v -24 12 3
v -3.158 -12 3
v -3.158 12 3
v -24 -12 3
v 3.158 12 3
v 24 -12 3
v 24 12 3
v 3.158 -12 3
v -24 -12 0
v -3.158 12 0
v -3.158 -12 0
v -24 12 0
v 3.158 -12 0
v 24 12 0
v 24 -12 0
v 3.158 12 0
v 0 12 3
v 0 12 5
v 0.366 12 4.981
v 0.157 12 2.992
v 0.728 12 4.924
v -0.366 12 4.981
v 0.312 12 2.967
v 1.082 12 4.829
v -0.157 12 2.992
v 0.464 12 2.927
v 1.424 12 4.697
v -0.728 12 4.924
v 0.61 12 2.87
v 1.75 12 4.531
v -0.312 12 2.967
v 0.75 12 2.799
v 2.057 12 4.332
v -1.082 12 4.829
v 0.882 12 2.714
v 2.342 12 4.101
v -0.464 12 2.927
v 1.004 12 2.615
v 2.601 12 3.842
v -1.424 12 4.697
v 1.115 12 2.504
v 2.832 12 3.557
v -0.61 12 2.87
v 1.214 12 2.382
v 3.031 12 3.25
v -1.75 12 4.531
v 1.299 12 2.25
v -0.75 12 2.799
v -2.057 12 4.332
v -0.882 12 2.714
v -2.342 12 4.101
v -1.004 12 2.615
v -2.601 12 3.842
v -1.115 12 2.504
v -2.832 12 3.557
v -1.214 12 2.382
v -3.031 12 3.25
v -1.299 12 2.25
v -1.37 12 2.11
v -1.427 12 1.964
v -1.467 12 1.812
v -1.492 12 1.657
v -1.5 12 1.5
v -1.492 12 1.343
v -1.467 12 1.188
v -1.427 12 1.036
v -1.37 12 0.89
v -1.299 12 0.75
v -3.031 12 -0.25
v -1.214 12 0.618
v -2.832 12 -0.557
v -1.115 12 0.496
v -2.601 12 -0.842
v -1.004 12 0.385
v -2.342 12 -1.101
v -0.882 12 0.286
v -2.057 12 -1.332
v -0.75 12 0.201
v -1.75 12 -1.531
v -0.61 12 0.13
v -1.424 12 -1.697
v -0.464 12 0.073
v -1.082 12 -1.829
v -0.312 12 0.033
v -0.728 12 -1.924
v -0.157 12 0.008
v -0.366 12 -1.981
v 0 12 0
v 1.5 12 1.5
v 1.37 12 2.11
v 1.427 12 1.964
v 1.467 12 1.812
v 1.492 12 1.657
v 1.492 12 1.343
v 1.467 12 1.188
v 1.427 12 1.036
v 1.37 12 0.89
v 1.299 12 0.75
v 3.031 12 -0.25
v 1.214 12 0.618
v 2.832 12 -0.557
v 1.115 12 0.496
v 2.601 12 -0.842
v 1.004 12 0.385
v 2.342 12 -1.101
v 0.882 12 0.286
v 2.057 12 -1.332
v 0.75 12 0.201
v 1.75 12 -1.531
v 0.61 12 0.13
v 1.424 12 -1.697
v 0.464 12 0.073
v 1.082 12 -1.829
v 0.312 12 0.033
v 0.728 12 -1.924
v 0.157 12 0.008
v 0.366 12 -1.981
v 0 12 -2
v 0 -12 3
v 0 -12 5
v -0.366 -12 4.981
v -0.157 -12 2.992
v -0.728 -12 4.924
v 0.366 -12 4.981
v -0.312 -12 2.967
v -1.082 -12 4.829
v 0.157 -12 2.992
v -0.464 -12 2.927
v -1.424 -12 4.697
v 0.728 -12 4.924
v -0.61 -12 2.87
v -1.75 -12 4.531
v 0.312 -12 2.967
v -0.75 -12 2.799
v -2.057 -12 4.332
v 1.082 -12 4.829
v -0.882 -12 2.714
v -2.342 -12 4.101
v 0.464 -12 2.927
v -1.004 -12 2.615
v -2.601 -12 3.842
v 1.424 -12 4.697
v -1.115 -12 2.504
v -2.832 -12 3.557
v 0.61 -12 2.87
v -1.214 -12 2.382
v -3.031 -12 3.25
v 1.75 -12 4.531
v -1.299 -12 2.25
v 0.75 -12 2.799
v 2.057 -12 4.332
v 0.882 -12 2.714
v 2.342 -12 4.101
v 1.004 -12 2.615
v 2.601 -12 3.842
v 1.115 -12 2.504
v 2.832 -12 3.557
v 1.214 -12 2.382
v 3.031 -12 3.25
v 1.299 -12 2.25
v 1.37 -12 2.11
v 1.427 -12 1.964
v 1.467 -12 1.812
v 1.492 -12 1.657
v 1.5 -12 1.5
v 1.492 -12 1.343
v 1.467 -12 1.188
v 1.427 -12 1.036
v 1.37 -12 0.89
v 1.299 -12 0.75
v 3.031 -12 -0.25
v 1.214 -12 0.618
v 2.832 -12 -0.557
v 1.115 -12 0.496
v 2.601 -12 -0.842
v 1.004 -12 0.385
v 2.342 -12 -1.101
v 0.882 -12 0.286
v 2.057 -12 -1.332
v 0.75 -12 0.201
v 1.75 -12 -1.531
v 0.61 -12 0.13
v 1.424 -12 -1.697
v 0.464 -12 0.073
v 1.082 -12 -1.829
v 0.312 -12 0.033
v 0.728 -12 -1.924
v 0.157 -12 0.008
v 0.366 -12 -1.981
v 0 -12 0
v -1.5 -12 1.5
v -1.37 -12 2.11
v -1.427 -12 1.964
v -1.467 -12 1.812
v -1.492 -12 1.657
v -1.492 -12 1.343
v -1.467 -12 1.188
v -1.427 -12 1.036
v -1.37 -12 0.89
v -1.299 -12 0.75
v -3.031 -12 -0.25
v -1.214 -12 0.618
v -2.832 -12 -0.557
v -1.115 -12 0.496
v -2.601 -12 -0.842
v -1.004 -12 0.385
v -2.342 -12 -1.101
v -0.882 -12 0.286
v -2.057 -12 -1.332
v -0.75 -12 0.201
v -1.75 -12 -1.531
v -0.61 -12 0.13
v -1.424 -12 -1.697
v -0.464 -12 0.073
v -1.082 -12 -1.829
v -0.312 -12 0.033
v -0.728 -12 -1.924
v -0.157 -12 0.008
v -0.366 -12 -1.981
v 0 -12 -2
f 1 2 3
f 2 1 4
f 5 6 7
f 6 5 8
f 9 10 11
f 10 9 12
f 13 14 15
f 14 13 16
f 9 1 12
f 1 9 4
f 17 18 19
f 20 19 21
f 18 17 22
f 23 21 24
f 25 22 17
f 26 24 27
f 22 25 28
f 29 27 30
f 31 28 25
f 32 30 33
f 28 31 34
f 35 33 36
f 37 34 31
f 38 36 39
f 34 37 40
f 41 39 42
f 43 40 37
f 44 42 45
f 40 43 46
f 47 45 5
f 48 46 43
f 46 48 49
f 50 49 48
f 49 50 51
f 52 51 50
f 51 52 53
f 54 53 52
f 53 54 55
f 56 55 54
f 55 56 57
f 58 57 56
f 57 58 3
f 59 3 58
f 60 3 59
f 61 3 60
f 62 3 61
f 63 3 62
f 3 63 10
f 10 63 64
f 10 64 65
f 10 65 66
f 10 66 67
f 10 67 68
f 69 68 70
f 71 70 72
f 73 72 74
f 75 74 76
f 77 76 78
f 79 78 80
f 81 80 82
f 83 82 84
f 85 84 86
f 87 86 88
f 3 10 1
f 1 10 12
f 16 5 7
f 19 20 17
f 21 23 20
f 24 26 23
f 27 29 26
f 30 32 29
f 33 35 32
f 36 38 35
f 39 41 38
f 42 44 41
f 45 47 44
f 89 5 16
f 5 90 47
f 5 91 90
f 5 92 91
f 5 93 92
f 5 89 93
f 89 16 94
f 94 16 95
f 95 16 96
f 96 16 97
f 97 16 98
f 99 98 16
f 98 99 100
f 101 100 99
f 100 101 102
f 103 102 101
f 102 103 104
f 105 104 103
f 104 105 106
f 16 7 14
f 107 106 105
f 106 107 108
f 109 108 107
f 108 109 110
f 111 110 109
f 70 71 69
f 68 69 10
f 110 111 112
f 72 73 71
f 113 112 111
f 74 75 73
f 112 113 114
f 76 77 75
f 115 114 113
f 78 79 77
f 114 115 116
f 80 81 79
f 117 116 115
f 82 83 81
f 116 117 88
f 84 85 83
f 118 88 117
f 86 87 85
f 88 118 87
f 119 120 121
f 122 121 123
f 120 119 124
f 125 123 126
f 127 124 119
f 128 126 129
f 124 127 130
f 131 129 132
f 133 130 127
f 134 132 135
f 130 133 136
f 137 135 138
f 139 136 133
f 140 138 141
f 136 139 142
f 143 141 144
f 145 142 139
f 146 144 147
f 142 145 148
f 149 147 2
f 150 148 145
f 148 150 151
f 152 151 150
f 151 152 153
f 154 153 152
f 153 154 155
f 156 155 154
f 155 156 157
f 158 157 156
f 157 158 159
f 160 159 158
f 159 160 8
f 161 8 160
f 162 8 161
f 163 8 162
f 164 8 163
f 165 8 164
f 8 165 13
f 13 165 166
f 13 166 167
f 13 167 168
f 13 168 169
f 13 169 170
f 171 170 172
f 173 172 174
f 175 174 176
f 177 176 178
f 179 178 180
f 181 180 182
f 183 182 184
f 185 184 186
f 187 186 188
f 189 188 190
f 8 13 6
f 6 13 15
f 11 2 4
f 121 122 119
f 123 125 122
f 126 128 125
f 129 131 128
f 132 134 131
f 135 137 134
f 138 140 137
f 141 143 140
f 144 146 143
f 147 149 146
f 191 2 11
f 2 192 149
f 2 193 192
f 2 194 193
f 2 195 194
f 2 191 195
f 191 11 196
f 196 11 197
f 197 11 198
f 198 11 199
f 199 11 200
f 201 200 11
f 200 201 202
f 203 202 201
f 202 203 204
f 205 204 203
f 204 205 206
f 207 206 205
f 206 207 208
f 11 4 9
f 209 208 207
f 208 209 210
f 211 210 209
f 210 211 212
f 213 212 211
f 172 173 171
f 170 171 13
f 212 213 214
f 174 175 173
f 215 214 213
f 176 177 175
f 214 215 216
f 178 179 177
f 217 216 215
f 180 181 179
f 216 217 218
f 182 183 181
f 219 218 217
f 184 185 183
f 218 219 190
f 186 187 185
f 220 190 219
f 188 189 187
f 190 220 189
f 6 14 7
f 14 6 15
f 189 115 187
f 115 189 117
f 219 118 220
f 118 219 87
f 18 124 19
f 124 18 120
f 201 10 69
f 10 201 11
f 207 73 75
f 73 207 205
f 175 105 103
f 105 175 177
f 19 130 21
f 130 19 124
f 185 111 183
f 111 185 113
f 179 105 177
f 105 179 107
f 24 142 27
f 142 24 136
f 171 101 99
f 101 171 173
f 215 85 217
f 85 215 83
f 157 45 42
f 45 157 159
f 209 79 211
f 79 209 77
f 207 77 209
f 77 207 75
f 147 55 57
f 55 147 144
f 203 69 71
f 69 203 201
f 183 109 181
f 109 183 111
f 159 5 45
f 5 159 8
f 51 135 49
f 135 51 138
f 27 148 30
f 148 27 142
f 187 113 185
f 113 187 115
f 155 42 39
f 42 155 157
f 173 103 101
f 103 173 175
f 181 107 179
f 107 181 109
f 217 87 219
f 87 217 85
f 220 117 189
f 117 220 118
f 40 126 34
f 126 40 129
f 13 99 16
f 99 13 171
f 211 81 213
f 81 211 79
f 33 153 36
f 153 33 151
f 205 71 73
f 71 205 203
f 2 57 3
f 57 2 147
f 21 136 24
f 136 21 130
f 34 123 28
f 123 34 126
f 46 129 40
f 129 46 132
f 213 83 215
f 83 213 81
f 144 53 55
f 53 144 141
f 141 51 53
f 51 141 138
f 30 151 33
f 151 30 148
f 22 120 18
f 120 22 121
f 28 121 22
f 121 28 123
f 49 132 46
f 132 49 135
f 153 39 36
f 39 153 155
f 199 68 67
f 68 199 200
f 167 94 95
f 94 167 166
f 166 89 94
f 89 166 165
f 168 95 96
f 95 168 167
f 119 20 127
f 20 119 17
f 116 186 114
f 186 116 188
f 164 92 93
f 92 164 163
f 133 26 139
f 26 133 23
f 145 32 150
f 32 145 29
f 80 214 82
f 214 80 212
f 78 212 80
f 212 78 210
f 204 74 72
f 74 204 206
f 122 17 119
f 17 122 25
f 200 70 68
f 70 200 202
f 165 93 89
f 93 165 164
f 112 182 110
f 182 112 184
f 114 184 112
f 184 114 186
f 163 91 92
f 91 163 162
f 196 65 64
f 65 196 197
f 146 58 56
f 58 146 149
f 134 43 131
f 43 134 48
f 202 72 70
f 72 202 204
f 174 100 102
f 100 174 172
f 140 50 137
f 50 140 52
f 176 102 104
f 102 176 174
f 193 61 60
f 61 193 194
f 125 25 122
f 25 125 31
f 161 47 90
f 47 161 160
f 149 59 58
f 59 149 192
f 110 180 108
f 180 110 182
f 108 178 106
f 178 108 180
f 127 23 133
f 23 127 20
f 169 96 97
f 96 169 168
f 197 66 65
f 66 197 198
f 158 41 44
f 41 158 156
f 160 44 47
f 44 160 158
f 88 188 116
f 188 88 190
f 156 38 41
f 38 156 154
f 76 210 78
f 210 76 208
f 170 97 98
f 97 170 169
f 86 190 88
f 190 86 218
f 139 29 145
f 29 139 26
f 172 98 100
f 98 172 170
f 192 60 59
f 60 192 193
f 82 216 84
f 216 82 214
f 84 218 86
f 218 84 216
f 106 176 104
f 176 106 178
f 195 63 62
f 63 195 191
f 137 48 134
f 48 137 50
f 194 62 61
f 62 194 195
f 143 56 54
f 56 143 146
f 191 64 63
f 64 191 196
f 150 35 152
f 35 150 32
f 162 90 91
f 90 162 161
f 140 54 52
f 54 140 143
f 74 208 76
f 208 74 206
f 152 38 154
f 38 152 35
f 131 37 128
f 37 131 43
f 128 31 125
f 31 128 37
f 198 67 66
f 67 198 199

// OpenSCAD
// Compact plate hinge.
$fn = 60;
eps = 0.02;
leaf_l = 24;
width = 24;
pin_d = 3;
leaf_t = 3;
difference() {
    union() {
        translate([-leaf_l,-width/2,0]) cube([leaf_l,width,leaf_t]);
        translate([0,-width/2,0]) cube([leaf_l,width,leaf_t]);
        translate([0,-width/2,leaf_t/2]) rotate([-90,0,0]) cylinder(d=pin_d+4,h=width);
    }
    translate([0,-width/2-eps,leaf_t/2]) rotate([-90,0,0]) cylinder(d=pin_d,h=width+2*eps);
}
